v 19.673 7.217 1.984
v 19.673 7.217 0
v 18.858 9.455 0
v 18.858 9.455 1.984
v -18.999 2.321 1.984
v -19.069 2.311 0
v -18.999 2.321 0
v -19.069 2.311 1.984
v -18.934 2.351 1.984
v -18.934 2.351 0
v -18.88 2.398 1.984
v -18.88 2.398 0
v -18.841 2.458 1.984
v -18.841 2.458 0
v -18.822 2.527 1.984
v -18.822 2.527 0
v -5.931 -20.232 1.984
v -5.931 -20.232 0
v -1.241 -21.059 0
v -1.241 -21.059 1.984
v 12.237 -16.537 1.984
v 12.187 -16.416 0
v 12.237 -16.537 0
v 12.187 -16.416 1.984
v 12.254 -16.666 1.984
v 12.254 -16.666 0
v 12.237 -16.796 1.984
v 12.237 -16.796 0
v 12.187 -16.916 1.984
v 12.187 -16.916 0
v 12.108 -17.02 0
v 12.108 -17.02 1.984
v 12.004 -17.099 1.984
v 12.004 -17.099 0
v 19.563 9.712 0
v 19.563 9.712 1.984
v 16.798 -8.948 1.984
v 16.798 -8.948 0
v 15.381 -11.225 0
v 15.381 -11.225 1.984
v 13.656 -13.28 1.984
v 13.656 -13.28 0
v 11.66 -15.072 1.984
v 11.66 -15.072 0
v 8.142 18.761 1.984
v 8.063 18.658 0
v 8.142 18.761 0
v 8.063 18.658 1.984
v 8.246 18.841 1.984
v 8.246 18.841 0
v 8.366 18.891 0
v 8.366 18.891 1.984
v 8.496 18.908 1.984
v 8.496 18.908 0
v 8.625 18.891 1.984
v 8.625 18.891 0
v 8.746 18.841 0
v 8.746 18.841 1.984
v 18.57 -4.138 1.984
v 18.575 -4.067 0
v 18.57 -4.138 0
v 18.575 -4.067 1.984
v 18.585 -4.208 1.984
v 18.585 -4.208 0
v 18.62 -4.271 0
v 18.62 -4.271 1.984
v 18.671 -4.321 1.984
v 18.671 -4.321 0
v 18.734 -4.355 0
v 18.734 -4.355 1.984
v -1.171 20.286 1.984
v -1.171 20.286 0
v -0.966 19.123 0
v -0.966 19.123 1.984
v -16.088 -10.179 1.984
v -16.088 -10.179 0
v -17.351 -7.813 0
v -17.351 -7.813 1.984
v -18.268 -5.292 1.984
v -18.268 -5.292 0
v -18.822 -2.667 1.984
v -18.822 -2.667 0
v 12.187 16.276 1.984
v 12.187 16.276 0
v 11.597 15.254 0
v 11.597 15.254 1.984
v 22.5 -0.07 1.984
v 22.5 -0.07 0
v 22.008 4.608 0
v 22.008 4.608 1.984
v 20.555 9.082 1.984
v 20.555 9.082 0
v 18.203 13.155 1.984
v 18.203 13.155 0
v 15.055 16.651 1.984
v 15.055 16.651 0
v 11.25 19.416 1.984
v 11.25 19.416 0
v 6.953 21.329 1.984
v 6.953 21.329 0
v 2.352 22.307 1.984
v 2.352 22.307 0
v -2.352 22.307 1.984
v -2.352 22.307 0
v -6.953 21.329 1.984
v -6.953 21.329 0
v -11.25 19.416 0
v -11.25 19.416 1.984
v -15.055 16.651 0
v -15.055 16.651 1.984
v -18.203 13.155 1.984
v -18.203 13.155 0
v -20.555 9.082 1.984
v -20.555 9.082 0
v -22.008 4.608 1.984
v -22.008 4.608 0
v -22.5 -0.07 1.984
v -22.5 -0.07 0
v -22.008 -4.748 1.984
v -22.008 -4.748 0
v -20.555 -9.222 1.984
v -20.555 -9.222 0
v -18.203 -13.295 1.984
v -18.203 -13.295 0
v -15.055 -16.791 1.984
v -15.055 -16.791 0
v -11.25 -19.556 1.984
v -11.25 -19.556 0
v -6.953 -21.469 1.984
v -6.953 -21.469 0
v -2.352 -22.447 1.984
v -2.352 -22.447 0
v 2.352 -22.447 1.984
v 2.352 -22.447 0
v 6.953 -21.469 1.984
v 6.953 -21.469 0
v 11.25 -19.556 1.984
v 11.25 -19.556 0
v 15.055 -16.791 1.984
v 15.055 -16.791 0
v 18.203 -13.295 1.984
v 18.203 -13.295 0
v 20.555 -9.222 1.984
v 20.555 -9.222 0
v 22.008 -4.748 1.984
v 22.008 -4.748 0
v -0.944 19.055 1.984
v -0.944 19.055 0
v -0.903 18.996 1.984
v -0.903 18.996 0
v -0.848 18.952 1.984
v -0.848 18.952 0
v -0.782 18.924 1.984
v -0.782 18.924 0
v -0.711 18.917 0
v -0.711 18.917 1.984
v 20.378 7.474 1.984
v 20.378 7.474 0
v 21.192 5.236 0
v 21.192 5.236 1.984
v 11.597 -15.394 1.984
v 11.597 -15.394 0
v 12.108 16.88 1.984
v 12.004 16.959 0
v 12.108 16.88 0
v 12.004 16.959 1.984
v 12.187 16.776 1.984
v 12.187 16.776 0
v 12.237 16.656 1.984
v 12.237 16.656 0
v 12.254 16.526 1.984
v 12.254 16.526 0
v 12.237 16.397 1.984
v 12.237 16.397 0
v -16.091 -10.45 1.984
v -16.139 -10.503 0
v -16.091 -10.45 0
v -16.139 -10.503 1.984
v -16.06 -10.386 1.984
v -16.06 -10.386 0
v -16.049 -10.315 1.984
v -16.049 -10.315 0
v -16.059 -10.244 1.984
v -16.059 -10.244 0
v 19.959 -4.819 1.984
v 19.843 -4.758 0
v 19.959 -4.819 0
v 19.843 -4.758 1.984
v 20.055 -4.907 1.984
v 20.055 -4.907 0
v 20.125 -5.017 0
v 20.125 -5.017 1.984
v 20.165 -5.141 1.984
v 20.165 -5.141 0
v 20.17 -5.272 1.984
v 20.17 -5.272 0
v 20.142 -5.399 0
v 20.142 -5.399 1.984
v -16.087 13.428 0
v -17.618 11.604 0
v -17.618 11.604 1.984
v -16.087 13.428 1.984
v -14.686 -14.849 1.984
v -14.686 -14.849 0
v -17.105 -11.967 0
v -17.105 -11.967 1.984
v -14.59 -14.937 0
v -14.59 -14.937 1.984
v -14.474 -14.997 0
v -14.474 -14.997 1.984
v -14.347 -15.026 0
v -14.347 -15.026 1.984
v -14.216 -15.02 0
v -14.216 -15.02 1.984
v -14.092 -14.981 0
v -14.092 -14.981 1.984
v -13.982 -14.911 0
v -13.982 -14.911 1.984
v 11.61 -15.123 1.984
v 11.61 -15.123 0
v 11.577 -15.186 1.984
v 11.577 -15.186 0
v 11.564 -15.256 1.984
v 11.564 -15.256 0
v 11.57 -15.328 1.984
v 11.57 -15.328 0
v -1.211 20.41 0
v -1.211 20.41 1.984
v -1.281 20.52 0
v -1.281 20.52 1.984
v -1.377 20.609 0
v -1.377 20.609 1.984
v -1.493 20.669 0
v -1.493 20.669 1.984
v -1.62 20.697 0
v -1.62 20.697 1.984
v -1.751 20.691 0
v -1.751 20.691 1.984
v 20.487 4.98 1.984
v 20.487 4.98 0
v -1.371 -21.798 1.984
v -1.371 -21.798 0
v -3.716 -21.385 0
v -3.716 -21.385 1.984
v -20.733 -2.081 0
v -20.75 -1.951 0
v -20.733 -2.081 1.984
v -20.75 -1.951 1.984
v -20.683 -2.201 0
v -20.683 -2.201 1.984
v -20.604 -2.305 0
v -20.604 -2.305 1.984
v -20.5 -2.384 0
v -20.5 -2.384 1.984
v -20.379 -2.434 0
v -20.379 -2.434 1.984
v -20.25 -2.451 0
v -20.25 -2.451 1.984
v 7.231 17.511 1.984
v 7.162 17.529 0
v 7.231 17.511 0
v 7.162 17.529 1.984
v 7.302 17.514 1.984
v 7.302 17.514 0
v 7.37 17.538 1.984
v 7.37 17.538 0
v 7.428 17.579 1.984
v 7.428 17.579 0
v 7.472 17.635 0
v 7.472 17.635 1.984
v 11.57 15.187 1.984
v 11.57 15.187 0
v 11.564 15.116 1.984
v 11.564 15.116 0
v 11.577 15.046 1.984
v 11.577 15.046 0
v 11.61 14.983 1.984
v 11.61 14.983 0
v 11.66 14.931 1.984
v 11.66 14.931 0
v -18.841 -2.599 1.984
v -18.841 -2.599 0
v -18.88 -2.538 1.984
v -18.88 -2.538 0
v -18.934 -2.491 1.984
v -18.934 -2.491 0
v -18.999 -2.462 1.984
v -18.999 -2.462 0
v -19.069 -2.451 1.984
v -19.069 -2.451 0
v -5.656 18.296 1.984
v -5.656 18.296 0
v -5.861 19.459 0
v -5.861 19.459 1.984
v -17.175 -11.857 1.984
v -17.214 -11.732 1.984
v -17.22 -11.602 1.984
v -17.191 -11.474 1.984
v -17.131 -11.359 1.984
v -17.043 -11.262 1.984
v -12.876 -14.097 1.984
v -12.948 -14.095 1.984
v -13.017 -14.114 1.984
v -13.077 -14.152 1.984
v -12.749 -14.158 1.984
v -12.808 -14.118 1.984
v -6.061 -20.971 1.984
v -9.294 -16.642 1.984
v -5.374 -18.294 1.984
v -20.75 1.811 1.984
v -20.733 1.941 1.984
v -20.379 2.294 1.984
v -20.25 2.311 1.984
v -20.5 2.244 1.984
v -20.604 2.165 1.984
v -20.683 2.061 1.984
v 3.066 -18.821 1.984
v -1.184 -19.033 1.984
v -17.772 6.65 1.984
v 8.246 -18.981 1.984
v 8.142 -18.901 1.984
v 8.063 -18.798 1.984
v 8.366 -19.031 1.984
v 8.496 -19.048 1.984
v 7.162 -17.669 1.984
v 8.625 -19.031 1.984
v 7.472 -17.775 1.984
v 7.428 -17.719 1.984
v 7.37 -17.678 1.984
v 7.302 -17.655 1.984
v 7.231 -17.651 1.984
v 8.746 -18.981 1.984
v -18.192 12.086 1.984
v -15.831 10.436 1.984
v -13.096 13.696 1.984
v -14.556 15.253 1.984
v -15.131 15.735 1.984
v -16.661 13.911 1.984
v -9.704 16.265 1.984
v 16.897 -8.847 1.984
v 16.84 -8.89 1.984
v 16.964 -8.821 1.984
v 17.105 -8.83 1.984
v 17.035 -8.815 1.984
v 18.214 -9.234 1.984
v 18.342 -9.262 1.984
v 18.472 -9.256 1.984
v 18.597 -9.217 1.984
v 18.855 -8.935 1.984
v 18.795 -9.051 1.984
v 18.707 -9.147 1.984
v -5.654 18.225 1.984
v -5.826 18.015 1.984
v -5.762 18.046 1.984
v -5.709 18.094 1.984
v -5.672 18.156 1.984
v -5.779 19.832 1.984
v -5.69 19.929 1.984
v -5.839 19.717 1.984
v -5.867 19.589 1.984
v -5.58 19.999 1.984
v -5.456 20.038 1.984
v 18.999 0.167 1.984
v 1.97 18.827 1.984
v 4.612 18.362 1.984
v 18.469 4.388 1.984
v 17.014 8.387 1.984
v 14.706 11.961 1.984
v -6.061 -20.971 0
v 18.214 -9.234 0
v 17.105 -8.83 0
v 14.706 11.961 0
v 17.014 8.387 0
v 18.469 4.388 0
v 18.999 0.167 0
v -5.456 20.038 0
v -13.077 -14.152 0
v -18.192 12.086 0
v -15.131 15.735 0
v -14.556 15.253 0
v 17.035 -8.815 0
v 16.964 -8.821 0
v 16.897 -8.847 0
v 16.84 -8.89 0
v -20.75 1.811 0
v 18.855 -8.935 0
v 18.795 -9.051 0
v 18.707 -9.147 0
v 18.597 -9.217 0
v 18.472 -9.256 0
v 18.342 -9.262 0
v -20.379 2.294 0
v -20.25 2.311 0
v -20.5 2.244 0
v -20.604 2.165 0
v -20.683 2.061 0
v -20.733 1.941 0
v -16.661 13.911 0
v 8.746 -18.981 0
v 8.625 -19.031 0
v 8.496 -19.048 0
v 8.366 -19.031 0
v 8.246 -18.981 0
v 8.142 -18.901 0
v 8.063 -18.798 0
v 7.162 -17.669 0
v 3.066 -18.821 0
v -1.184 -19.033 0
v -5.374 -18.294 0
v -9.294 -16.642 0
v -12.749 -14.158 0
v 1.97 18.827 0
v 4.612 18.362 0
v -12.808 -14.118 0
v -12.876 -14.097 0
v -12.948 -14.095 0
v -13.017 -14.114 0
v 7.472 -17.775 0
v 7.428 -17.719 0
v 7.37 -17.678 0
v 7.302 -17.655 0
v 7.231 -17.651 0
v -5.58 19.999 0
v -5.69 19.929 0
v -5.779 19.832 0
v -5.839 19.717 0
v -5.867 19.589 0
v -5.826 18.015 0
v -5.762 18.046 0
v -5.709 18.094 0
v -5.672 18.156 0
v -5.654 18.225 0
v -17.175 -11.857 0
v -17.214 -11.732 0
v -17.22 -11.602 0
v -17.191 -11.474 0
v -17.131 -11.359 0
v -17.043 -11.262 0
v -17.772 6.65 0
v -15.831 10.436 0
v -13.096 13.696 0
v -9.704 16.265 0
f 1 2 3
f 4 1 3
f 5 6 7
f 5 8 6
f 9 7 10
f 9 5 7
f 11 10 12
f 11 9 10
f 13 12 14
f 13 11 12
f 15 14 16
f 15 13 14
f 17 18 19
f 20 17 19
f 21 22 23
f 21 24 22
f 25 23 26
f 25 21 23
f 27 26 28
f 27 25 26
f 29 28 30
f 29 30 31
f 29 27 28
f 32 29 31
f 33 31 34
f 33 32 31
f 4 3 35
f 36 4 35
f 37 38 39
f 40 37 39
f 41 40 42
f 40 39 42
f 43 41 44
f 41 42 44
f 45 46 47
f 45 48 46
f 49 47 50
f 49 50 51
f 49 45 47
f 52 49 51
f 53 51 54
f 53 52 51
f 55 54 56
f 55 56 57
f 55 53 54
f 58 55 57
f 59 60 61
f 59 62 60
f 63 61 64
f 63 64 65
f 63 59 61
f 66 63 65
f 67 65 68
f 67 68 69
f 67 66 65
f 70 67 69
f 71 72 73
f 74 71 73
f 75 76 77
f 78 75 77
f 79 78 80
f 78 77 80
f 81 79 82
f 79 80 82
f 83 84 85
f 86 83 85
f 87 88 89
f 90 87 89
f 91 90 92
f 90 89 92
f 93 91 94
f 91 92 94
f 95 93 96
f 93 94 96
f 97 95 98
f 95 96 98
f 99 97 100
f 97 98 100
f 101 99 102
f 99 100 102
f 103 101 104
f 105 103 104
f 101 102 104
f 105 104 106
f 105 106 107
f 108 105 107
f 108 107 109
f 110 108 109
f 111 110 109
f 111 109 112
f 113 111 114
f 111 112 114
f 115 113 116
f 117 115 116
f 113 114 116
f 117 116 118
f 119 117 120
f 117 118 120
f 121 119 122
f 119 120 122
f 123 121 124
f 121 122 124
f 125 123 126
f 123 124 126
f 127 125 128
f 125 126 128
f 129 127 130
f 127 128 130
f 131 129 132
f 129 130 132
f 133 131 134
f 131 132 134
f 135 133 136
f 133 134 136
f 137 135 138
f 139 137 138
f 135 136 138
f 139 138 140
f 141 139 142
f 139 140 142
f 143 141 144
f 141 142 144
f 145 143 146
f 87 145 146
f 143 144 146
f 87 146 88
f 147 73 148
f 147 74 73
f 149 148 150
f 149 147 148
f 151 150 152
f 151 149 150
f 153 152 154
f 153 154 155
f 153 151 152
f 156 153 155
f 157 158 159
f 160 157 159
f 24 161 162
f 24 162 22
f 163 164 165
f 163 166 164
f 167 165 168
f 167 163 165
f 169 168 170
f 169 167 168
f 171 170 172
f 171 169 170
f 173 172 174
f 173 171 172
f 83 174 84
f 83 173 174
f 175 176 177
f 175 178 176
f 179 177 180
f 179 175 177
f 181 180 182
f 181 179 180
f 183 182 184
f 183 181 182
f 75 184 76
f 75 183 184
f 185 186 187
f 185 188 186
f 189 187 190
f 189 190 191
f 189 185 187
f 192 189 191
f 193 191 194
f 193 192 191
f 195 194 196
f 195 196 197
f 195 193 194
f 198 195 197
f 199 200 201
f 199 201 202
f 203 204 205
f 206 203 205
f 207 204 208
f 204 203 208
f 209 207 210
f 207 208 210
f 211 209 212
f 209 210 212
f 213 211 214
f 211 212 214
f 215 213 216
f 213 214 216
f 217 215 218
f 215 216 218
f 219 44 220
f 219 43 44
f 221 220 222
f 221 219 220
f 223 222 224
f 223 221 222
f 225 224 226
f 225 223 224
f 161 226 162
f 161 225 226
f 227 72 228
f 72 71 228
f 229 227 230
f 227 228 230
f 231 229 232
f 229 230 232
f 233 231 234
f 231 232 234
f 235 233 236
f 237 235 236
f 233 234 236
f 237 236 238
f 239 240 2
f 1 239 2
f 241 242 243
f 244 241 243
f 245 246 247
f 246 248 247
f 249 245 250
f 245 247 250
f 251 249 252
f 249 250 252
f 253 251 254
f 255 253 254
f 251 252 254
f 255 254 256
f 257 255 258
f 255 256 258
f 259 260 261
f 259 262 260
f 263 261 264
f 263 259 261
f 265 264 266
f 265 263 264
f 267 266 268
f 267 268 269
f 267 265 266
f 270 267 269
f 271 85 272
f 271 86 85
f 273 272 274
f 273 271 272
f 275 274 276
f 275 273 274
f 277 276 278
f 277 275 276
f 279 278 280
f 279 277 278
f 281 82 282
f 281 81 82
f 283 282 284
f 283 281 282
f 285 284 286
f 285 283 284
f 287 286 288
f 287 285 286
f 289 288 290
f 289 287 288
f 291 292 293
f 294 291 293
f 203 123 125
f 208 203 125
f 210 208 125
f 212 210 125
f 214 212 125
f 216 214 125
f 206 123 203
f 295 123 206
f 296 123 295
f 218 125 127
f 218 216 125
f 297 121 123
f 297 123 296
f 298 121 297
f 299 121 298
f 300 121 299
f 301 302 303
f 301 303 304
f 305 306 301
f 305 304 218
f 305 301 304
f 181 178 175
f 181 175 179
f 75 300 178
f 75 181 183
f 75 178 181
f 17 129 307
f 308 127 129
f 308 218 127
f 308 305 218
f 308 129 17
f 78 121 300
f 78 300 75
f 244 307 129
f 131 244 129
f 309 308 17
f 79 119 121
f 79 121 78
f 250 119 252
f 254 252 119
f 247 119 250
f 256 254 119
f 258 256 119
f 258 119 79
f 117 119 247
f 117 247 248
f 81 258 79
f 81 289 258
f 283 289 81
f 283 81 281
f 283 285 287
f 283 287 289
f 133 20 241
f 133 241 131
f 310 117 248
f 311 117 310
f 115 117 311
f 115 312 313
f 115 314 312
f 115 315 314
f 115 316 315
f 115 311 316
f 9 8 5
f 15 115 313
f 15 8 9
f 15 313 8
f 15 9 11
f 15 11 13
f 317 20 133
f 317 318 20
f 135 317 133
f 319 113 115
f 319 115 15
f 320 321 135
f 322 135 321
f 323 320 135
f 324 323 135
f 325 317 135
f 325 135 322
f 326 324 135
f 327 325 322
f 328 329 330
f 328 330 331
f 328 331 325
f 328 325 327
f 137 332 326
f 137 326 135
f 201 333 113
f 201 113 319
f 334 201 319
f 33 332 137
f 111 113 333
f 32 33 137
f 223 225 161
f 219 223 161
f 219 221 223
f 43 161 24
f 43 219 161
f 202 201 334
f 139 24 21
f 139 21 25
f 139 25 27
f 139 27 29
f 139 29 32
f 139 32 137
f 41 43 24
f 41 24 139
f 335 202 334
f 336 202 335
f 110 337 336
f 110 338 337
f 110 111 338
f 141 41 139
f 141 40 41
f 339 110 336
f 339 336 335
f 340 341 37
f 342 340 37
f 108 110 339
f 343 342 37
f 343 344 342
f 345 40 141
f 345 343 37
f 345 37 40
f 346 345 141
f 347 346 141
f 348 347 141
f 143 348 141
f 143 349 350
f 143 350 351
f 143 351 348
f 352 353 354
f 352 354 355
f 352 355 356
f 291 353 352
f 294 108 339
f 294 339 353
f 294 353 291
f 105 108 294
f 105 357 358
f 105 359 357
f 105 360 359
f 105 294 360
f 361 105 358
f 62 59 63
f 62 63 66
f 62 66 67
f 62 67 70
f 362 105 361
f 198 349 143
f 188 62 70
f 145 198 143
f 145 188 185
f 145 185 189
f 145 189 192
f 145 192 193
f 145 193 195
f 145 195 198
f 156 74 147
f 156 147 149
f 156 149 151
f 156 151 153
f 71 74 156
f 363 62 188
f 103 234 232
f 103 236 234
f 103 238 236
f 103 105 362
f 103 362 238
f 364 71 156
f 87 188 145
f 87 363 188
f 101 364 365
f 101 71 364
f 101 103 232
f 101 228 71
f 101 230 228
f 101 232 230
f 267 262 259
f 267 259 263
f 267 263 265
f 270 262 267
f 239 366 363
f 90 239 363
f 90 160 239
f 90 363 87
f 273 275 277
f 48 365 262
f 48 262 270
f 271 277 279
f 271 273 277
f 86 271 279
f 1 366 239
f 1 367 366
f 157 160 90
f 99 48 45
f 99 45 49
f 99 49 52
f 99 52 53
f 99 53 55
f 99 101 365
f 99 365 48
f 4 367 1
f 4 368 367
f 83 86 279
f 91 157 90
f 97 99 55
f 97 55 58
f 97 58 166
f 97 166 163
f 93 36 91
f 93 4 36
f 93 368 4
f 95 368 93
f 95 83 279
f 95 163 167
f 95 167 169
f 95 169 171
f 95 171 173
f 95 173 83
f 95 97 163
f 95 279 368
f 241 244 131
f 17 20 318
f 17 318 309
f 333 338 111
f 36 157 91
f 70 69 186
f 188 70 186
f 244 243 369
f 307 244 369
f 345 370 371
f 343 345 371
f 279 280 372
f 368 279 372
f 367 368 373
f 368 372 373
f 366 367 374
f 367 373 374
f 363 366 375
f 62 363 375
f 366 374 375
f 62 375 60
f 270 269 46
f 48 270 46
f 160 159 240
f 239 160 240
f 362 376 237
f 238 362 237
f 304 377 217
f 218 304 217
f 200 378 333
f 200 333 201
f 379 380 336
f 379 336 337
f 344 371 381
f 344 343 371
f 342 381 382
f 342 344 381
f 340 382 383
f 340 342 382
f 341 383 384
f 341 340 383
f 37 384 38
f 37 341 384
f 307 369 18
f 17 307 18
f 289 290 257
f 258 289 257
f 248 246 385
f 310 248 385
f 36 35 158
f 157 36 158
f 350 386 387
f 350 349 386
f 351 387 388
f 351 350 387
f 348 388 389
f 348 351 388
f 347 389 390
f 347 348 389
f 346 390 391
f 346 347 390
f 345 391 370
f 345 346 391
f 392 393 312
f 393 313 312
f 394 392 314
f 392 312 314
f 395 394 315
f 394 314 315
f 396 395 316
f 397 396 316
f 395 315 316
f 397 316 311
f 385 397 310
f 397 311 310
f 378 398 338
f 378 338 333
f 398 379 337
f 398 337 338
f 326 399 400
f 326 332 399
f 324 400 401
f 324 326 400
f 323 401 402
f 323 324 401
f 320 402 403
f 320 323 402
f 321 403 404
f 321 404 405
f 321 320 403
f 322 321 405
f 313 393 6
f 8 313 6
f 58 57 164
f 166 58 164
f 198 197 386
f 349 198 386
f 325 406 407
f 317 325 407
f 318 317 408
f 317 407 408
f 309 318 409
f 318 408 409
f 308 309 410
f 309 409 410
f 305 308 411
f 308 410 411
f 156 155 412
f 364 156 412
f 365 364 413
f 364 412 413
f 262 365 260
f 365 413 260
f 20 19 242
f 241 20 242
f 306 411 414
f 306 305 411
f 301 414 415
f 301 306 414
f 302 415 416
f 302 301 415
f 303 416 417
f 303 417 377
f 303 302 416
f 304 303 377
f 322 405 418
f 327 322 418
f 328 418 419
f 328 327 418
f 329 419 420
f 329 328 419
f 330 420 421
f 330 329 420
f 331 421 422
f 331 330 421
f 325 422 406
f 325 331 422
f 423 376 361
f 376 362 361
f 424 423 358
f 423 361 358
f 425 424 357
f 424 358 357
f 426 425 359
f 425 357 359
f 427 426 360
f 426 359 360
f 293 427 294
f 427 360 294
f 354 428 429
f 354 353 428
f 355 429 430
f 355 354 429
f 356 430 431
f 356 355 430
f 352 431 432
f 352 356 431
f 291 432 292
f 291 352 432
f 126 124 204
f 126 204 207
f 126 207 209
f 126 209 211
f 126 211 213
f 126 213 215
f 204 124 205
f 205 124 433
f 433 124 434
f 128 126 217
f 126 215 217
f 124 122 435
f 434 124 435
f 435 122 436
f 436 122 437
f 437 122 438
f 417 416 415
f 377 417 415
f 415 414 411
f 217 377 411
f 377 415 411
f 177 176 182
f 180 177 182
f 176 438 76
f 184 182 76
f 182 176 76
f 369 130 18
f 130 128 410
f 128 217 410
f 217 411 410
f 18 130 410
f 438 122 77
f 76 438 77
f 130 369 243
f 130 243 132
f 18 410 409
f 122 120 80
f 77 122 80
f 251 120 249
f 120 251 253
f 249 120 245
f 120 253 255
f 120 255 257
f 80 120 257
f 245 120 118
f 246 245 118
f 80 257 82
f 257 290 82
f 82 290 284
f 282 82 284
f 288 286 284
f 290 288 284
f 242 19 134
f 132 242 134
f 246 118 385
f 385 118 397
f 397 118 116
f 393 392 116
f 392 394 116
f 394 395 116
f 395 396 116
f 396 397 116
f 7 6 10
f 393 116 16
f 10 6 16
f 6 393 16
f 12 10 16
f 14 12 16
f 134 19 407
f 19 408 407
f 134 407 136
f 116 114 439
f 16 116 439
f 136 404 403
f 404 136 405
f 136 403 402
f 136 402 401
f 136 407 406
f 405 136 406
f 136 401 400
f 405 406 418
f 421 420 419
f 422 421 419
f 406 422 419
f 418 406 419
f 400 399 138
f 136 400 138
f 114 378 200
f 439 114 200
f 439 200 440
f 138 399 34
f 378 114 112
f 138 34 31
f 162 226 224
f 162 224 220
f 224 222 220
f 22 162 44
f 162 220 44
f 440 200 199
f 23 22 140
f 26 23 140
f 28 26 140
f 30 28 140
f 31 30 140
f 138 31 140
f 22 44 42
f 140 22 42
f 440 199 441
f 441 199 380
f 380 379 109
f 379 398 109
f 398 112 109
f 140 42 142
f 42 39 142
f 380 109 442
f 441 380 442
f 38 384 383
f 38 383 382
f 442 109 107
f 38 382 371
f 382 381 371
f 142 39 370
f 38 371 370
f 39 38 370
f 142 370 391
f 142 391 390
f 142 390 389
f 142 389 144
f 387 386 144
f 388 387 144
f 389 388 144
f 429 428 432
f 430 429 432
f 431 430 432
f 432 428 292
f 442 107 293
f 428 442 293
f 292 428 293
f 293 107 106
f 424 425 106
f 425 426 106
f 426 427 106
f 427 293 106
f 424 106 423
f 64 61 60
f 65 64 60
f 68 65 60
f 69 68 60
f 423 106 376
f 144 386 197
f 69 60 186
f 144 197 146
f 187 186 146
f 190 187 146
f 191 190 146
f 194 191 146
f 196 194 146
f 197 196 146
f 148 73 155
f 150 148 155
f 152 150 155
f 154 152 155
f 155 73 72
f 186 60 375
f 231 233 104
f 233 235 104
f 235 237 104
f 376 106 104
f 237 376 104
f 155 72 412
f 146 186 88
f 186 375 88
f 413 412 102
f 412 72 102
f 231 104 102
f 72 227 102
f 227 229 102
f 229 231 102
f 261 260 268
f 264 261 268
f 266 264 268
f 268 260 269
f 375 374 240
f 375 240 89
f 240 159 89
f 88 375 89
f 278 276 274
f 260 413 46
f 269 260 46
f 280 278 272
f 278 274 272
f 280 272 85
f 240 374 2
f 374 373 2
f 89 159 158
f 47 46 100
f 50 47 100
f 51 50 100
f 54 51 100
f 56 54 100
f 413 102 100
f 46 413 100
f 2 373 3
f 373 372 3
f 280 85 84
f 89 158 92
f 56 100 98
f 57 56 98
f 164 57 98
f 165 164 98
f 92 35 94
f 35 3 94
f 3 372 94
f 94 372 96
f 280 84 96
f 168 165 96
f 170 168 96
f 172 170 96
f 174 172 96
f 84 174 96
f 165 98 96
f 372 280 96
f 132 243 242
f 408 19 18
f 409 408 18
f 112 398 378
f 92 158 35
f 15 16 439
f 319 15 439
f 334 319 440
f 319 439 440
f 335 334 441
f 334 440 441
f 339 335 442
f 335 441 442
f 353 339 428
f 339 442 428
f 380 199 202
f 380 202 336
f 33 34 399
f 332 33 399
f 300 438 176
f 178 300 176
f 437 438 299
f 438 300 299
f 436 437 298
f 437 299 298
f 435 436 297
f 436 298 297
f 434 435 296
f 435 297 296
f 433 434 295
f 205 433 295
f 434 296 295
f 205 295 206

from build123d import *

# Parameters (mm, degrees)
SKETCH1_R           = 22.5
BOSS_EXTRUDE1_DEPTH = 1.984375
FILLET1_R           = 0.25
FILLET2_R           = 0.5


with BuildPart() as part:
    # Sketch1 → Boss-Extrude1 (new body)
    with BuildSketch(Plane.XY):
        with Locations((0, -0.070071084)):
            Circle(SKETCH1_R)
        with BuildLine():
            Line((-1.258126225, 20.778189514), (-0.928227613, 18.907241516))
            ThreePointArc((-0.928227613, 18.907241516), (3.299315376, 18.641276223), (7.362871814, 17.445296987))
            Line((7.362871814, 17.445296987), (8.312777007, 19.090581045))
            Line((8.312777007, 19.090581045), (12.437222993, 16.709331045))
            Line((12.437222993, 16.709331045), (11.487317799, 15.064046987))
            ThreePointArc((11.487317799, 15.064046987), (17.854159795, 6.428311639), (18.527819546, -4.279572584))
            Line((18.527819546, -4.279572584), (20.313057348, -4.929346005))
            Line((20.313057348, -4.929346005), (18.684186415, -9.404632111))
            Line((18.684186415, -9.404632111), (16.898948613, -8.75485869))
            ThreePointArc((16.898948613, -8.75485869), (14.554844419, -12.283035668), (11.487317799, -15.204189155))
            Line((11.487317799, -15.204189155), (12.437222993, -16.849473212))
            Line((12.437222993, -16.849473212), (8.312777007, -19.230723212))
            Line((8.312777007, -19.230723212), (7.362871814, -17.585439155))
            ThreePointArc((7.362871814, -17.585439155), (-3.299315376, -18.781418391), (-12.909445009, -14.010882737))
            Line((-12.909445009, -14.010882737), (-14.364784199, -15.232057315))
            Line((-14.364784199, -15.232057315), (-17.42606019, -11.583770655))
            Line((-17.42606019, -11.583770655), (-15.970721, -10.362596077))
            ThreePointArc((-15.970721, -10.362596077), (-17.854159795, -6.568453807), (-18.850189613, -2.451321084))
            Line((-18.850189613, -2.451321084), (-20.75, -2.451321084))
            Line((-20.75, -2.451321084), (-20.75, 2.311178916))
            Line((-20.75, 2.311178916), (-18.850189613, 2.311178916))
            ThreePointArc((-18.850189613, 2.311178916), (-14.554844419, 12.1428935), (-5.618374537, 18.080242069))
            Line((-5.618374537, 18.080242069), (-5.948273148, 19.951190068))
            Line((-5.948273148, 19.951190068), (-1.258126225, 20.778189514))
        make_face(mode=Mode.SUBTRACT)
        Polygon((20.377631163, 7.473973659), (21.19206663, 5.236330606), (20.487297164, 4.979815499), (19.672861698, 7.217458552), (18.858426231, 9.455101605), (19.563195697, 9.711616713), align=None, mode=Mode.SUBTRACT)
        Polygon((-14.55629531, 15.25261205), (-15.130828642, 15.734702757), (-16.661466638, 13.910559427), (-18.192104633, 12.086416097), (-17.617571301, 11.604325389), (-16.086933305, 13.428468719), align=None, mode=Mode.SUBTRACT)
        Polygon((-3.716164525, -21.384533086), (-6.061237987, -20.971033363), (-5.931001854, -20.232427548), (-3.585928392, -20.645927271), (-1.24085493, -21.059426994), (-1.371091064, -21.798032809), align=None, mode=Mode.SUBTRACT)
    extrude(amount=BOSS_EXTRUDE1_DEPTH)

    # Fillet1
    fillet1_edges = [part.edges().sort_by_distance(p)[0] for p in [
        (-18.850189613, -2.451321084, 0.9921875),
        (-15.970721, -10.362596077, 0.9921875),
        (-12.909445009, -14.010882737, 0.9921875),
        (7.362871814, -17.585439155, 0.9921875),
        (11.487317799, -15.204189155, 0.9921875),
        (16.898948613, -8.75485869, 0.9921875),
        (18.527819546, -4.279572584, 0.9921875),
        (11.487317799, 15.064046987, 0.9921875),
        (7.362871814, 17.445296987, 0.9921875),
        (-0.928227613, 18.907241516, 0.9921875),
        (-5.618374537, 18.080242069, 0.9921875),
        (-18.850189613, 2.311178916, 0.9921875),
    ]]
    fillet(fillet1_edges, radius=FILLET1_R)

    # Fillet2
    fillet2_edges = [part.edges().sort_by_distance(p)[0] for p in [
        (-17.42606019, -11.583770655, 0.9921875),
        (-14.364784199, -15.232057315, 0.9921875),
        (8.312777007, -19.230723212, 0.9921875),
        (12.437222993, -16.849473212, 0.9921875),
        (18.684186415, -9.404632111, 0.9921875),
        (20.313057348, -4.929346005, 0.9921875),
        (12.437222993, 16.709331045, 0.9921875),
        (8.312777007, 19.090581045, 0.9921875),
        (-1.258126225, 20.778189514, 0.9921875),
        (-5.948273148, 19.951190068, 0.9921875),
        (-20.75, 2.311178916, 0.9921875),
        (-20.75, -2.451321084, 0.9921875),
    ]]
    fillet(fillet2_edges, radius=FILLET2_R)


solid = part.part
